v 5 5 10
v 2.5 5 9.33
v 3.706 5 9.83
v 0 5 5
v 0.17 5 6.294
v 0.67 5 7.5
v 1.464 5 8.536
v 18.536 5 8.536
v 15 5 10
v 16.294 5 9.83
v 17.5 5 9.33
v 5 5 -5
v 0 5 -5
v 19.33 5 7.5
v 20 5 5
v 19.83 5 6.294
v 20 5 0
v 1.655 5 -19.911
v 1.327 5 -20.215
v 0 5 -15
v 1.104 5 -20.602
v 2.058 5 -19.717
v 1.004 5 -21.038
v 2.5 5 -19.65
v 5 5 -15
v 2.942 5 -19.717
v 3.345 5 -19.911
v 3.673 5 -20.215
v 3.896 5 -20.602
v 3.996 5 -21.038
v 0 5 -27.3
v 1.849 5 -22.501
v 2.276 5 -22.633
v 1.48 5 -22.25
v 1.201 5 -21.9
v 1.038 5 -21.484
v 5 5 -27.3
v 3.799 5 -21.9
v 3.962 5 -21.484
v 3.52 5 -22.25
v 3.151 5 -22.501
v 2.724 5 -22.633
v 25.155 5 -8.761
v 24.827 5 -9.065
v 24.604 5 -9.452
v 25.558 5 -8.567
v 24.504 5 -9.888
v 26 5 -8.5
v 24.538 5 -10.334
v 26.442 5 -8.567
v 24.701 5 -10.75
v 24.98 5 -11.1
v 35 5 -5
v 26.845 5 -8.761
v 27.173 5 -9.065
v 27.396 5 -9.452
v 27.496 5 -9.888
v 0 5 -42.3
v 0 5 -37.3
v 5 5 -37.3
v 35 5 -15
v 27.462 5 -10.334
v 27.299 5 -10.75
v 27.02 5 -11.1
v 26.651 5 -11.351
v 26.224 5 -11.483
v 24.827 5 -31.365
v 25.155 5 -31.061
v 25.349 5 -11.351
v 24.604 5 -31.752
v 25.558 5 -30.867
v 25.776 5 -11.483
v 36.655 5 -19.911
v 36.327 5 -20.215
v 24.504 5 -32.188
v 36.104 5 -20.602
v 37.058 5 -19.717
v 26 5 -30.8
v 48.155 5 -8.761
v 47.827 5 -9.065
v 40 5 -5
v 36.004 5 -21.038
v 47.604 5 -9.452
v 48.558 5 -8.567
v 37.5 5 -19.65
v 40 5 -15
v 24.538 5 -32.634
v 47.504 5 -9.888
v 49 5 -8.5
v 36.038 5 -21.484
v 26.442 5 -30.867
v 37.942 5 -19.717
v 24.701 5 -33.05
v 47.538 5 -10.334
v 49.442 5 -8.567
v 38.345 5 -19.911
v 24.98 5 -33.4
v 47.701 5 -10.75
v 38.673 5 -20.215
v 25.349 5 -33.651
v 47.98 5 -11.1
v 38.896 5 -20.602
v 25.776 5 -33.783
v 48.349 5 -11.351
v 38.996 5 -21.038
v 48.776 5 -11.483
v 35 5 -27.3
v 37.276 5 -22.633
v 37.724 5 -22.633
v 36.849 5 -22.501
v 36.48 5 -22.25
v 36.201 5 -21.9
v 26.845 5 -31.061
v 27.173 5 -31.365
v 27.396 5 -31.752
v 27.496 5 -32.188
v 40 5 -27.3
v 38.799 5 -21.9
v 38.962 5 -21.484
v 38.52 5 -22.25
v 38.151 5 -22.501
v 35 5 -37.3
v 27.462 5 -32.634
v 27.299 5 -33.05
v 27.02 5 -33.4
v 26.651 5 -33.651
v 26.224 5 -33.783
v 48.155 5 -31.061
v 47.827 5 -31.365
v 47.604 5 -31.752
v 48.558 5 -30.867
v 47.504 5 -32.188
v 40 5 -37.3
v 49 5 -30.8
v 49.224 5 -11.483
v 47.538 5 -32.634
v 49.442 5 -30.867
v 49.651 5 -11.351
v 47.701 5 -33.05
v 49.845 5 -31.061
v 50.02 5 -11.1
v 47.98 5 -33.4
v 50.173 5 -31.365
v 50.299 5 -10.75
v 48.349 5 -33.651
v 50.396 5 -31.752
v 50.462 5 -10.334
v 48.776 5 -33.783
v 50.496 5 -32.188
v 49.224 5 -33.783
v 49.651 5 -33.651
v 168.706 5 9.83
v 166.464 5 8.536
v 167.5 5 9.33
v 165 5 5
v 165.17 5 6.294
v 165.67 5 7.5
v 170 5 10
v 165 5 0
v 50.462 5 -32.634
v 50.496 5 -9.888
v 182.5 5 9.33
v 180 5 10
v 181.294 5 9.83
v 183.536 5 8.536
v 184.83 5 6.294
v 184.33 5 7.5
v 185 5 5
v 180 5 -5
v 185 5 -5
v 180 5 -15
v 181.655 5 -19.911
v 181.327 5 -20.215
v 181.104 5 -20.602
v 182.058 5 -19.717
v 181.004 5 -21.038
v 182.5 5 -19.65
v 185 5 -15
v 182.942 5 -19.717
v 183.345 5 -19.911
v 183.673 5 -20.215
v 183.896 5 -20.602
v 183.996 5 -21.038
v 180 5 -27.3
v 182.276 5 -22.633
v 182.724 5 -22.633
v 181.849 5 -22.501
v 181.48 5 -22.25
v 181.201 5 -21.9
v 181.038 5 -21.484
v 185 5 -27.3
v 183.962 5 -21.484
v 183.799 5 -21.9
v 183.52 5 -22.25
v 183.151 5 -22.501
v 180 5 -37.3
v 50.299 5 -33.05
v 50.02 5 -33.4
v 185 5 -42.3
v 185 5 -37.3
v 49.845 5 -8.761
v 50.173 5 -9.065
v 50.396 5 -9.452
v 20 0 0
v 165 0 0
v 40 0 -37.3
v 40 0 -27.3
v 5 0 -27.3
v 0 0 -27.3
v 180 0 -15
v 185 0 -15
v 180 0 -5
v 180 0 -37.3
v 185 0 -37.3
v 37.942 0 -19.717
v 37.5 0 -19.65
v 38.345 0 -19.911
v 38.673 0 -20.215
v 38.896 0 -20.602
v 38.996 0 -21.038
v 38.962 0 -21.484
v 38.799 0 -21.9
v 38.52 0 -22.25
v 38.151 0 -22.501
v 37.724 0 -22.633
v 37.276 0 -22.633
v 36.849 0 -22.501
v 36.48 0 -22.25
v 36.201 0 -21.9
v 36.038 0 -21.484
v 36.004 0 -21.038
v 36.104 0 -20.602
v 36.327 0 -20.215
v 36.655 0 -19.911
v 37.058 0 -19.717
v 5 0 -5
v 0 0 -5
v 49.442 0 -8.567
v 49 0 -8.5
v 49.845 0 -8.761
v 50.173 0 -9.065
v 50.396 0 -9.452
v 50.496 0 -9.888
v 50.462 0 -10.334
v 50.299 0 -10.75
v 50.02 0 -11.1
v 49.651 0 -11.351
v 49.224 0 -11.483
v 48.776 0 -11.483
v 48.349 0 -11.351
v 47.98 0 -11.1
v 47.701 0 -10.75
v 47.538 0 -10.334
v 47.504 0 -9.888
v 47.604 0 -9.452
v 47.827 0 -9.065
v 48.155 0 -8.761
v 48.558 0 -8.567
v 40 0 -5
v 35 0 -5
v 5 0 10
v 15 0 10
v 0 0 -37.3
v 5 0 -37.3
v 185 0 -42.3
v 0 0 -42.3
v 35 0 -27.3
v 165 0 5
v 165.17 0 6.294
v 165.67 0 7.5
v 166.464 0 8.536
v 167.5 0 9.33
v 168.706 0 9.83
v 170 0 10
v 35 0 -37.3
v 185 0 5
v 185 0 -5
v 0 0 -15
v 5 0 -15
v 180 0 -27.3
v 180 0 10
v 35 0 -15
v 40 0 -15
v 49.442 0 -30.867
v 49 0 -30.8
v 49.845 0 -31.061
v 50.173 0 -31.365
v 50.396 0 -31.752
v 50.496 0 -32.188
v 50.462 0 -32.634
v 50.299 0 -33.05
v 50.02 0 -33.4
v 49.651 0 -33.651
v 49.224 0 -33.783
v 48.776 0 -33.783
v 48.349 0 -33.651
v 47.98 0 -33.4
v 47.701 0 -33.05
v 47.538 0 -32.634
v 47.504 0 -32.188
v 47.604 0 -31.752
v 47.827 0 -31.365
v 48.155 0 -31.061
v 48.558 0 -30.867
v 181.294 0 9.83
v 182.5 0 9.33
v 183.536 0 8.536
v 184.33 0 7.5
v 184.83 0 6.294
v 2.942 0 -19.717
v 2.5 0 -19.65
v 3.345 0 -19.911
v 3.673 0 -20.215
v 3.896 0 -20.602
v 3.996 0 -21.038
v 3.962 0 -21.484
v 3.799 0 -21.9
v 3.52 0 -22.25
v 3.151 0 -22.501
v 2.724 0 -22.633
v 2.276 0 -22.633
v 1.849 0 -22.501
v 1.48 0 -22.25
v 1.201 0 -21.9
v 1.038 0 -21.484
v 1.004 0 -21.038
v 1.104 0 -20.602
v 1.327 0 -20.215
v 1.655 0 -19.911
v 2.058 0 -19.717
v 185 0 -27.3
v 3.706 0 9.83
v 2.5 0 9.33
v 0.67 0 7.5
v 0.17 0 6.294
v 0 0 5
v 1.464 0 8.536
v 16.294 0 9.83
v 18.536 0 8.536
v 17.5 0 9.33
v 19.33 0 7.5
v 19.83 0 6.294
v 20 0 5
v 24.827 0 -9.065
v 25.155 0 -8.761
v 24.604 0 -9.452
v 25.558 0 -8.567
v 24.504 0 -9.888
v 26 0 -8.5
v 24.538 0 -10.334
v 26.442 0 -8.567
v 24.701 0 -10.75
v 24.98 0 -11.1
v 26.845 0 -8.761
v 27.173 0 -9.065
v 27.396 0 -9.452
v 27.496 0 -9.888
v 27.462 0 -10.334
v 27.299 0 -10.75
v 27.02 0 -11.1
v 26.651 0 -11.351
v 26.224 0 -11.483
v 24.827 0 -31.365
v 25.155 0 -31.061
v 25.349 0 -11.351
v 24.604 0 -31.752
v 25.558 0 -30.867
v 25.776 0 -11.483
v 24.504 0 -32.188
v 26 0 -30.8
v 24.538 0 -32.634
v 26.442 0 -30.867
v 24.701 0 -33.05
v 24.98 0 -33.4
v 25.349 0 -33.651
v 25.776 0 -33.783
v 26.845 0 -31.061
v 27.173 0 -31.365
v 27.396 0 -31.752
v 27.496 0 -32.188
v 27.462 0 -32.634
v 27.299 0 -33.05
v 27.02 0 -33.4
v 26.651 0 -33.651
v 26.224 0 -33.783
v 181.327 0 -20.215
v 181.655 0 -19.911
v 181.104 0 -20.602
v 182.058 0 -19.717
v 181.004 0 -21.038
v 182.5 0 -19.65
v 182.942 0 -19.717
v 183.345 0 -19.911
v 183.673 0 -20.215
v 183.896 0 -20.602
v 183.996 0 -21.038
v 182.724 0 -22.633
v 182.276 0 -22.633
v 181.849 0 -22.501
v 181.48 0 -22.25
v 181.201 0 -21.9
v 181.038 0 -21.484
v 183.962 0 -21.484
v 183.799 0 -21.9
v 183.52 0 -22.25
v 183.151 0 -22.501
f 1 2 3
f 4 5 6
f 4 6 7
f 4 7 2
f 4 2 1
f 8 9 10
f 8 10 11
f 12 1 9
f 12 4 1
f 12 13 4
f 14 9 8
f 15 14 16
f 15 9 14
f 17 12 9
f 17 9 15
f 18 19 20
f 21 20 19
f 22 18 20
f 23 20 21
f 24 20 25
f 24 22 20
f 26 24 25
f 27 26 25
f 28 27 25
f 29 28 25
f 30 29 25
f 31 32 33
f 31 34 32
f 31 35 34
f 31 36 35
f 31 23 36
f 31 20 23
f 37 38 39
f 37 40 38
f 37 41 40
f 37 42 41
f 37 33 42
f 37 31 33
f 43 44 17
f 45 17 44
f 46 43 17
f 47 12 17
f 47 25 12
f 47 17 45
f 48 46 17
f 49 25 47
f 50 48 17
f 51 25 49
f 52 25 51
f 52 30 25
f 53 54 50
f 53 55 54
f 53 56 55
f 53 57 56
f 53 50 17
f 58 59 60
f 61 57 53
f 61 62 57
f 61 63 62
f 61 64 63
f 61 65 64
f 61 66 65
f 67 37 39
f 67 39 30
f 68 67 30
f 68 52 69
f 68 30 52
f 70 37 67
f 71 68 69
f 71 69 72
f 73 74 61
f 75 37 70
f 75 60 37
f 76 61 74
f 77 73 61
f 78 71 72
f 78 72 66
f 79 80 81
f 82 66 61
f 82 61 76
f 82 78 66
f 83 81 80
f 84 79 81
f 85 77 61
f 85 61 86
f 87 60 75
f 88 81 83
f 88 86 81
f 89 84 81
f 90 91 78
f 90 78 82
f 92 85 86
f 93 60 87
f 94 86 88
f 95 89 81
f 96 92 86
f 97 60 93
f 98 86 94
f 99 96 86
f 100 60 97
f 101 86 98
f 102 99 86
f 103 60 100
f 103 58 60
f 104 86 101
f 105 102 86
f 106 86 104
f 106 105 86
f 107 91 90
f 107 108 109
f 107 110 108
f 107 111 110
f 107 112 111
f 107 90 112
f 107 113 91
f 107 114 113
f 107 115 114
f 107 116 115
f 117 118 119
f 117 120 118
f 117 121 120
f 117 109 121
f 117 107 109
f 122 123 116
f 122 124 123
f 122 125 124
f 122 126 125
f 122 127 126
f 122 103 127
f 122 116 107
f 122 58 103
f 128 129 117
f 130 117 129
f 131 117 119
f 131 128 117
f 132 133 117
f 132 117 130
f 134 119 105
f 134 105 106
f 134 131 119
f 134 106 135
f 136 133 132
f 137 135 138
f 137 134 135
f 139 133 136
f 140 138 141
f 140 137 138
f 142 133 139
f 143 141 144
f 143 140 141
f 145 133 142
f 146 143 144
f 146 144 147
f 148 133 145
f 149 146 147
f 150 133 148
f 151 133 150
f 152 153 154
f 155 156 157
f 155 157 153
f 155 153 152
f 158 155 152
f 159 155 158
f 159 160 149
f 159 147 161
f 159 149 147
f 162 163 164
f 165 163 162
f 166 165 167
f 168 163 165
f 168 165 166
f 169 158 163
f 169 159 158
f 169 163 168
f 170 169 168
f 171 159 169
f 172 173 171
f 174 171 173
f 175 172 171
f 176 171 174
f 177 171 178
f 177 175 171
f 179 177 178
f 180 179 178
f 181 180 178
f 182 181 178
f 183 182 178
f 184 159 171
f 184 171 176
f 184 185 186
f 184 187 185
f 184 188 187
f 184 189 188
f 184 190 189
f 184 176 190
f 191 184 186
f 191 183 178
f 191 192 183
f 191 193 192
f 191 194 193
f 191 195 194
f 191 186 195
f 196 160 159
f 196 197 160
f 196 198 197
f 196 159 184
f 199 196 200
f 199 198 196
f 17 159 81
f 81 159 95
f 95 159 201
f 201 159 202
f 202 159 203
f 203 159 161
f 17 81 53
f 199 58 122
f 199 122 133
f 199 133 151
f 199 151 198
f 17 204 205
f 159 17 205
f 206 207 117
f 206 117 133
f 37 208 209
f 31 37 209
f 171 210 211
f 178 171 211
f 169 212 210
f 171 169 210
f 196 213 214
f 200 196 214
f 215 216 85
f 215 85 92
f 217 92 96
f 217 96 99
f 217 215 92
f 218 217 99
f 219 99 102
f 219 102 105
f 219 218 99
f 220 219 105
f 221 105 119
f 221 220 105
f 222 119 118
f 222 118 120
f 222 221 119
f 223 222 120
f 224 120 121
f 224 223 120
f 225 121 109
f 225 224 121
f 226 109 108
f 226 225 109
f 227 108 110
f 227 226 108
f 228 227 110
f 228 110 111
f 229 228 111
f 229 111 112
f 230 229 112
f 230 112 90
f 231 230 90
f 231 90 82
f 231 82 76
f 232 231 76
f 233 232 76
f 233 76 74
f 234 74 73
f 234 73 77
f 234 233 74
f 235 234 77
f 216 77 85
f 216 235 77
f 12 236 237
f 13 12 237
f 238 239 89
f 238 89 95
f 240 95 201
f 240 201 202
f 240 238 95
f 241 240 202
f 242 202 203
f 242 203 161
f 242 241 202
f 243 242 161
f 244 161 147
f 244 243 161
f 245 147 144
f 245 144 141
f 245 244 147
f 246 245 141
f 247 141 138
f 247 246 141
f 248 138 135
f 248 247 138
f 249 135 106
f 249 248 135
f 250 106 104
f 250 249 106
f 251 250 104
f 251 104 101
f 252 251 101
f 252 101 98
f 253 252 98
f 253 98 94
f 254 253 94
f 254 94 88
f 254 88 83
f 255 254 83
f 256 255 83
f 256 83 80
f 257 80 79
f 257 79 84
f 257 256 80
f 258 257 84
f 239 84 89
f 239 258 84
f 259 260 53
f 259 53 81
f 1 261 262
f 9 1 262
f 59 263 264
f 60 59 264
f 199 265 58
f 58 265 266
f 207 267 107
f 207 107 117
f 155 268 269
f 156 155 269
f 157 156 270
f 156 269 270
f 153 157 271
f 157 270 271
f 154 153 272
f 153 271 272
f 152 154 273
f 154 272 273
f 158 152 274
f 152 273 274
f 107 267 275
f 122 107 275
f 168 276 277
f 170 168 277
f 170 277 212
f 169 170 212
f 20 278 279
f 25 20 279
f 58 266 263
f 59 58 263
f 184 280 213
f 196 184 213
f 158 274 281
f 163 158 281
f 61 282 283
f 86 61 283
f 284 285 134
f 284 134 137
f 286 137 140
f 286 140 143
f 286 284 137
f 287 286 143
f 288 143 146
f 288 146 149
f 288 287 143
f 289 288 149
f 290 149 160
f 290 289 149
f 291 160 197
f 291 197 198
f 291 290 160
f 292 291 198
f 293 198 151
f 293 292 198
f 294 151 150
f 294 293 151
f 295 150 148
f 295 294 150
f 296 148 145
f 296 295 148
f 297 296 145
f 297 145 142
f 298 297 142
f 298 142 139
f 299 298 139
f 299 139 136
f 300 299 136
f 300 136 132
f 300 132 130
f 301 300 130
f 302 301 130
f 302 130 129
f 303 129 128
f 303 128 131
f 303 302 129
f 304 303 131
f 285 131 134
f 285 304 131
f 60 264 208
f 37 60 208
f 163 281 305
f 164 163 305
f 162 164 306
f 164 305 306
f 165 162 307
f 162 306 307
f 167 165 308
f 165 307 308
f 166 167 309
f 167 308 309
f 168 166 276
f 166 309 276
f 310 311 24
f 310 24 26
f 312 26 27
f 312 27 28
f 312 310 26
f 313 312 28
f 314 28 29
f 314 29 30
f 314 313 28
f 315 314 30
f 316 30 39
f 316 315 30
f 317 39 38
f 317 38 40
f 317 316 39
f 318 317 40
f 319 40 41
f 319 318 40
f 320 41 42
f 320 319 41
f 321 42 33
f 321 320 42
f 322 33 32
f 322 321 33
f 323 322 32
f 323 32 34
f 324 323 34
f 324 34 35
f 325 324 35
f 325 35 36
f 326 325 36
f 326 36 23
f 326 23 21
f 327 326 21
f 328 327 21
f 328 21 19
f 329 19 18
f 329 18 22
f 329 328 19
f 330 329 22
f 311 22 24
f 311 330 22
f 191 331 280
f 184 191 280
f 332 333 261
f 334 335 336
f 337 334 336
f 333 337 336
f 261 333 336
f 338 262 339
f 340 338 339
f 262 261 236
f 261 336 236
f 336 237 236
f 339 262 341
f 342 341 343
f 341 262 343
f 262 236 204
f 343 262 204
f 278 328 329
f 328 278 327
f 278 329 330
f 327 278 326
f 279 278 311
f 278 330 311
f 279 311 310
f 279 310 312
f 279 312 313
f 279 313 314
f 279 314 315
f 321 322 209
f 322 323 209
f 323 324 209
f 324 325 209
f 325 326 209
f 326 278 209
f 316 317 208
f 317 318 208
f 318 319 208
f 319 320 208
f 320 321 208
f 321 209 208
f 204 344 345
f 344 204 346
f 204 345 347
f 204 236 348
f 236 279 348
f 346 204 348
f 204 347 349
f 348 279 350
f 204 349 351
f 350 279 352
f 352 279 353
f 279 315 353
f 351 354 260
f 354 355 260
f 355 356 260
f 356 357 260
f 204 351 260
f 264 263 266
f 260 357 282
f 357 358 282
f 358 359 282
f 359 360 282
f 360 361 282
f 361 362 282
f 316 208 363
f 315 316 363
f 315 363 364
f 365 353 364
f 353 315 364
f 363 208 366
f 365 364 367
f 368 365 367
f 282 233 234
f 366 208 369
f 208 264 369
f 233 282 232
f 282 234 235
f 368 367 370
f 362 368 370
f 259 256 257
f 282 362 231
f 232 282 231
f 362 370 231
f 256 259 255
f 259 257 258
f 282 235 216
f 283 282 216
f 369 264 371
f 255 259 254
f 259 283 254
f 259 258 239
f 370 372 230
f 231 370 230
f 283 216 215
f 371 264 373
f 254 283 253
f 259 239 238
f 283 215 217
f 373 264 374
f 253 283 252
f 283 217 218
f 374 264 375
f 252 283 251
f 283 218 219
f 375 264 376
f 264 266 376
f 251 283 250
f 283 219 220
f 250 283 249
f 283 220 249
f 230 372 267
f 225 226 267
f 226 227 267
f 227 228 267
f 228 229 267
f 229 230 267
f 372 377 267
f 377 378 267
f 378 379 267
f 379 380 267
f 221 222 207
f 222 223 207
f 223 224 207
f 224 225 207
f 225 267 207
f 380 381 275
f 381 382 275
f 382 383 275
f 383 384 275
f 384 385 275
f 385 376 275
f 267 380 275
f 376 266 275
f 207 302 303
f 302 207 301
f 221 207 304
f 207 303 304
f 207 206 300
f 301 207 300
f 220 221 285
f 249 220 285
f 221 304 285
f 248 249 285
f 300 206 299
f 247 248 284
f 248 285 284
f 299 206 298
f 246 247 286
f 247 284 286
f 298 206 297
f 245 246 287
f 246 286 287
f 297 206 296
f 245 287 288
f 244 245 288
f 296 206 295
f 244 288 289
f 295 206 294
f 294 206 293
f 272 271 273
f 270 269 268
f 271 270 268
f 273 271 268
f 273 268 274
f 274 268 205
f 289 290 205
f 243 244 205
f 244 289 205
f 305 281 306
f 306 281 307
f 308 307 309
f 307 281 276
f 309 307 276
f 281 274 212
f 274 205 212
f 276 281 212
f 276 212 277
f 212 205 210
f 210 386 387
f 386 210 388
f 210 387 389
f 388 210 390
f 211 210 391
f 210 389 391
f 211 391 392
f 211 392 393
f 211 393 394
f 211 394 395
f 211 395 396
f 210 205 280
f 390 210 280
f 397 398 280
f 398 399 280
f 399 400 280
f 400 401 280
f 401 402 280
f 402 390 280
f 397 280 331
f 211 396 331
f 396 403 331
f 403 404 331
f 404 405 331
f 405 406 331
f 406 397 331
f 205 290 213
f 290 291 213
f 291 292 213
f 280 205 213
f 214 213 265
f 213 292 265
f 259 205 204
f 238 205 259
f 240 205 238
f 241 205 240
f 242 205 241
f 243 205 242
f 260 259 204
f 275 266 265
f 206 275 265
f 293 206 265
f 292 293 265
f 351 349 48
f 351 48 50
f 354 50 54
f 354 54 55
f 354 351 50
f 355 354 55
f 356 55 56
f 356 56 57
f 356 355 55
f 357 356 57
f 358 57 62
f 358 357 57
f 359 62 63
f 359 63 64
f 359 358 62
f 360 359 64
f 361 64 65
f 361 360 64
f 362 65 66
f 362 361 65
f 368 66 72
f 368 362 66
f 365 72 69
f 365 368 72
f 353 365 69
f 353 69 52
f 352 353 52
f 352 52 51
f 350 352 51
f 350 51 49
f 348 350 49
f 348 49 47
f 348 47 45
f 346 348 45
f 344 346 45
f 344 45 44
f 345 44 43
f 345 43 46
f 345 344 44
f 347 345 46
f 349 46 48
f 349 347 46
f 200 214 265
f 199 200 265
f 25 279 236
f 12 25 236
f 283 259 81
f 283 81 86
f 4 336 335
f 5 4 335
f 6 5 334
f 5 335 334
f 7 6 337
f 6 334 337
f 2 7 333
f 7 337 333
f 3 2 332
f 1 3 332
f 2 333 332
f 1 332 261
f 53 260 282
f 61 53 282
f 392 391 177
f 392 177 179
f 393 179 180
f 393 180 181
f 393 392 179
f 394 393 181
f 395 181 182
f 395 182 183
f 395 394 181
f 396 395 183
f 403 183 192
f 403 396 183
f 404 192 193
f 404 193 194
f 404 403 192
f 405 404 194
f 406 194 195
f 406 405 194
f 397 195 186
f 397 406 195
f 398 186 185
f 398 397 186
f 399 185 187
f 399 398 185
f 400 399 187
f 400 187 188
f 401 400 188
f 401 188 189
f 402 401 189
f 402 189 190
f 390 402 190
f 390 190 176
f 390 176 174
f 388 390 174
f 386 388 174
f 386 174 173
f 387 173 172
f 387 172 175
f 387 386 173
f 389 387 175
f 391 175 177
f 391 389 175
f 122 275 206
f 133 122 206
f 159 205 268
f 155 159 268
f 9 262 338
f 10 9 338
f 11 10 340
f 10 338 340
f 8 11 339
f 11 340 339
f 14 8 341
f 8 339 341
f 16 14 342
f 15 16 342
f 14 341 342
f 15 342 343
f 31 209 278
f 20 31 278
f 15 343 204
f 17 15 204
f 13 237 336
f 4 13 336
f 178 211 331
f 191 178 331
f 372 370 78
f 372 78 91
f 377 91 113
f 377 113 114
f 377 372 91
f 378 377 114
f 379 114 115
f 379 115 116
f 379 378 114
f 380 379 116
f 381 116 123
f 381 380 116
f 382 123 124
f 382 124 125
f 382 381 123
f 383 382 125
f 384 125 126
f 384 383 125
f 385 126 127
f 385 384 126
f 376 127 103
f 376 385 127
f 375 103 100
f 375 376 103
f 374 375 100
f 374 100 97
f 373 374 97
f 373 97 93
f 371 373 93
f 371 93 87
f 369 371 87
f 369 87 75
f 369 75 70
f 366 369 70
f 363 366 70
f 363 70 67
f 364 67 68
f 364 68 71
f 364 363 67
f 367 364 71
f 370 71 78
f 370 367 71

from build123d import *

# Parameters (mm, degrees)
SKETCH_1_R      = 1.5
SKETCH_1_W      = 5
SKETCH_1_H      = 10
EXTRUDE_1_DEPTH = 5


with BuildPart() as part:
    # 草图1 → 凸台-拉伸1 (new body)
    with BuildSketch(Plane(origin=(0, 0, 0), x_dir=(1, 0, 0), z_dir=(0, 1, 0))):
        with BuildLine():
            Line((0, 0), (0, -5))
            ThreePointArc((0, -5), (1.464466094, -8.535533906), (5, -10))
            Line((5, -10), (15, -10))
            ThreePointArc((15, -10), (18.535533906, -8.535533906), (20, -5))
            Line((20, -5), (20, 0))
            Line((20, 0), (165, 0))
            Line((165, 0), (165, -5))
            ThreePointArc((165, -5), (166.464466094, -8.535533906), (170, -10))
            Line((170, -10), (180, -10))
            ThreePointArc((180, -10), (183.535533906, -8.535533906), (185, -5))
            Line((185, -5), (185, 0))
            Line((185, 0), (185, 5))
            Line((185, 5), (180, 5))
            Line((180, 5), (180, 15))
            Line((180, 15), (185, 15))
            Line((185, 15), (185, 27.3))
            Line((185, 27.3), (180, 27.3))
            Line((180, 27.3), (180, 37.3))
            Line((180, 37.3), (185, 37.3))
            Line((185, 37.3), (185, 42.3))
            Line((185, 42.3), (0, 42.3))
            Line((0, 42.3), (0, 37.3))
            Line((0, 37.3), (5, 37.3))
            Line((5, 37.3), (5, 27.3))
            Line((5, 27.3), (0, 27.3))
            Line((0, 27.3), (0, 15))
            Line((0, 15), (5, 15))
            Line((5, 15), (5, 5))
            Line((5, 5), (0, 5))
            Line((0, 5), (0, 0))
        make_face()
        with Locations(Location((26, 32.3, 0), (0, 0, 270))):
            Circle(SKETCH_1_R, mode=Mode.SUBTRACT)
        with Locations(Location((49, 32.3, 0), (0, 0, 270))):
            Circle(SKETCH_1_R, mode=Mode.SUBTRACT)
        with Locations(Location((26, 10, 0), (0, 0, 270))):
            Circle(SKETCH_1_R, mode=Mode.SUBTRACT)
        with Locations(Location((49, 10, 0), (0, 0, 270))):
            Circle(SKETCH_1_R, mode=Mode.SUBTRACT)
        with Locations(Location((2.5, 21.15, 0), (0, 0, 270))):
            Circle(SKETCH_1_R, mode=Mode.SUBTRACT)
        with Locations(Location((182.5, 21.15, 0), (0, 0, 270))):
            Circle(SKETCH_1_R, mode=Mode.SUBTRACT)
        with Locations(Location((37.5, 21.15, 0), (0, 0, 270))):
            Circle(SKETCH_1_R, mode=Mode.SUBTRACT)
        with Locations((37.5, 32.3)):
            Rectangle(SKETCH_1_W, SKETCH_1_H, mode=Mode.SUBTRACT)
        with Locations((37.5, 10)):
            Rectangle(SKETCH_1_W, SKETCH_1_H, mode=Mode.SUBTRACT)
    extrude(amount=EXTRUDE_1_DEPTH)


solid = part.part
